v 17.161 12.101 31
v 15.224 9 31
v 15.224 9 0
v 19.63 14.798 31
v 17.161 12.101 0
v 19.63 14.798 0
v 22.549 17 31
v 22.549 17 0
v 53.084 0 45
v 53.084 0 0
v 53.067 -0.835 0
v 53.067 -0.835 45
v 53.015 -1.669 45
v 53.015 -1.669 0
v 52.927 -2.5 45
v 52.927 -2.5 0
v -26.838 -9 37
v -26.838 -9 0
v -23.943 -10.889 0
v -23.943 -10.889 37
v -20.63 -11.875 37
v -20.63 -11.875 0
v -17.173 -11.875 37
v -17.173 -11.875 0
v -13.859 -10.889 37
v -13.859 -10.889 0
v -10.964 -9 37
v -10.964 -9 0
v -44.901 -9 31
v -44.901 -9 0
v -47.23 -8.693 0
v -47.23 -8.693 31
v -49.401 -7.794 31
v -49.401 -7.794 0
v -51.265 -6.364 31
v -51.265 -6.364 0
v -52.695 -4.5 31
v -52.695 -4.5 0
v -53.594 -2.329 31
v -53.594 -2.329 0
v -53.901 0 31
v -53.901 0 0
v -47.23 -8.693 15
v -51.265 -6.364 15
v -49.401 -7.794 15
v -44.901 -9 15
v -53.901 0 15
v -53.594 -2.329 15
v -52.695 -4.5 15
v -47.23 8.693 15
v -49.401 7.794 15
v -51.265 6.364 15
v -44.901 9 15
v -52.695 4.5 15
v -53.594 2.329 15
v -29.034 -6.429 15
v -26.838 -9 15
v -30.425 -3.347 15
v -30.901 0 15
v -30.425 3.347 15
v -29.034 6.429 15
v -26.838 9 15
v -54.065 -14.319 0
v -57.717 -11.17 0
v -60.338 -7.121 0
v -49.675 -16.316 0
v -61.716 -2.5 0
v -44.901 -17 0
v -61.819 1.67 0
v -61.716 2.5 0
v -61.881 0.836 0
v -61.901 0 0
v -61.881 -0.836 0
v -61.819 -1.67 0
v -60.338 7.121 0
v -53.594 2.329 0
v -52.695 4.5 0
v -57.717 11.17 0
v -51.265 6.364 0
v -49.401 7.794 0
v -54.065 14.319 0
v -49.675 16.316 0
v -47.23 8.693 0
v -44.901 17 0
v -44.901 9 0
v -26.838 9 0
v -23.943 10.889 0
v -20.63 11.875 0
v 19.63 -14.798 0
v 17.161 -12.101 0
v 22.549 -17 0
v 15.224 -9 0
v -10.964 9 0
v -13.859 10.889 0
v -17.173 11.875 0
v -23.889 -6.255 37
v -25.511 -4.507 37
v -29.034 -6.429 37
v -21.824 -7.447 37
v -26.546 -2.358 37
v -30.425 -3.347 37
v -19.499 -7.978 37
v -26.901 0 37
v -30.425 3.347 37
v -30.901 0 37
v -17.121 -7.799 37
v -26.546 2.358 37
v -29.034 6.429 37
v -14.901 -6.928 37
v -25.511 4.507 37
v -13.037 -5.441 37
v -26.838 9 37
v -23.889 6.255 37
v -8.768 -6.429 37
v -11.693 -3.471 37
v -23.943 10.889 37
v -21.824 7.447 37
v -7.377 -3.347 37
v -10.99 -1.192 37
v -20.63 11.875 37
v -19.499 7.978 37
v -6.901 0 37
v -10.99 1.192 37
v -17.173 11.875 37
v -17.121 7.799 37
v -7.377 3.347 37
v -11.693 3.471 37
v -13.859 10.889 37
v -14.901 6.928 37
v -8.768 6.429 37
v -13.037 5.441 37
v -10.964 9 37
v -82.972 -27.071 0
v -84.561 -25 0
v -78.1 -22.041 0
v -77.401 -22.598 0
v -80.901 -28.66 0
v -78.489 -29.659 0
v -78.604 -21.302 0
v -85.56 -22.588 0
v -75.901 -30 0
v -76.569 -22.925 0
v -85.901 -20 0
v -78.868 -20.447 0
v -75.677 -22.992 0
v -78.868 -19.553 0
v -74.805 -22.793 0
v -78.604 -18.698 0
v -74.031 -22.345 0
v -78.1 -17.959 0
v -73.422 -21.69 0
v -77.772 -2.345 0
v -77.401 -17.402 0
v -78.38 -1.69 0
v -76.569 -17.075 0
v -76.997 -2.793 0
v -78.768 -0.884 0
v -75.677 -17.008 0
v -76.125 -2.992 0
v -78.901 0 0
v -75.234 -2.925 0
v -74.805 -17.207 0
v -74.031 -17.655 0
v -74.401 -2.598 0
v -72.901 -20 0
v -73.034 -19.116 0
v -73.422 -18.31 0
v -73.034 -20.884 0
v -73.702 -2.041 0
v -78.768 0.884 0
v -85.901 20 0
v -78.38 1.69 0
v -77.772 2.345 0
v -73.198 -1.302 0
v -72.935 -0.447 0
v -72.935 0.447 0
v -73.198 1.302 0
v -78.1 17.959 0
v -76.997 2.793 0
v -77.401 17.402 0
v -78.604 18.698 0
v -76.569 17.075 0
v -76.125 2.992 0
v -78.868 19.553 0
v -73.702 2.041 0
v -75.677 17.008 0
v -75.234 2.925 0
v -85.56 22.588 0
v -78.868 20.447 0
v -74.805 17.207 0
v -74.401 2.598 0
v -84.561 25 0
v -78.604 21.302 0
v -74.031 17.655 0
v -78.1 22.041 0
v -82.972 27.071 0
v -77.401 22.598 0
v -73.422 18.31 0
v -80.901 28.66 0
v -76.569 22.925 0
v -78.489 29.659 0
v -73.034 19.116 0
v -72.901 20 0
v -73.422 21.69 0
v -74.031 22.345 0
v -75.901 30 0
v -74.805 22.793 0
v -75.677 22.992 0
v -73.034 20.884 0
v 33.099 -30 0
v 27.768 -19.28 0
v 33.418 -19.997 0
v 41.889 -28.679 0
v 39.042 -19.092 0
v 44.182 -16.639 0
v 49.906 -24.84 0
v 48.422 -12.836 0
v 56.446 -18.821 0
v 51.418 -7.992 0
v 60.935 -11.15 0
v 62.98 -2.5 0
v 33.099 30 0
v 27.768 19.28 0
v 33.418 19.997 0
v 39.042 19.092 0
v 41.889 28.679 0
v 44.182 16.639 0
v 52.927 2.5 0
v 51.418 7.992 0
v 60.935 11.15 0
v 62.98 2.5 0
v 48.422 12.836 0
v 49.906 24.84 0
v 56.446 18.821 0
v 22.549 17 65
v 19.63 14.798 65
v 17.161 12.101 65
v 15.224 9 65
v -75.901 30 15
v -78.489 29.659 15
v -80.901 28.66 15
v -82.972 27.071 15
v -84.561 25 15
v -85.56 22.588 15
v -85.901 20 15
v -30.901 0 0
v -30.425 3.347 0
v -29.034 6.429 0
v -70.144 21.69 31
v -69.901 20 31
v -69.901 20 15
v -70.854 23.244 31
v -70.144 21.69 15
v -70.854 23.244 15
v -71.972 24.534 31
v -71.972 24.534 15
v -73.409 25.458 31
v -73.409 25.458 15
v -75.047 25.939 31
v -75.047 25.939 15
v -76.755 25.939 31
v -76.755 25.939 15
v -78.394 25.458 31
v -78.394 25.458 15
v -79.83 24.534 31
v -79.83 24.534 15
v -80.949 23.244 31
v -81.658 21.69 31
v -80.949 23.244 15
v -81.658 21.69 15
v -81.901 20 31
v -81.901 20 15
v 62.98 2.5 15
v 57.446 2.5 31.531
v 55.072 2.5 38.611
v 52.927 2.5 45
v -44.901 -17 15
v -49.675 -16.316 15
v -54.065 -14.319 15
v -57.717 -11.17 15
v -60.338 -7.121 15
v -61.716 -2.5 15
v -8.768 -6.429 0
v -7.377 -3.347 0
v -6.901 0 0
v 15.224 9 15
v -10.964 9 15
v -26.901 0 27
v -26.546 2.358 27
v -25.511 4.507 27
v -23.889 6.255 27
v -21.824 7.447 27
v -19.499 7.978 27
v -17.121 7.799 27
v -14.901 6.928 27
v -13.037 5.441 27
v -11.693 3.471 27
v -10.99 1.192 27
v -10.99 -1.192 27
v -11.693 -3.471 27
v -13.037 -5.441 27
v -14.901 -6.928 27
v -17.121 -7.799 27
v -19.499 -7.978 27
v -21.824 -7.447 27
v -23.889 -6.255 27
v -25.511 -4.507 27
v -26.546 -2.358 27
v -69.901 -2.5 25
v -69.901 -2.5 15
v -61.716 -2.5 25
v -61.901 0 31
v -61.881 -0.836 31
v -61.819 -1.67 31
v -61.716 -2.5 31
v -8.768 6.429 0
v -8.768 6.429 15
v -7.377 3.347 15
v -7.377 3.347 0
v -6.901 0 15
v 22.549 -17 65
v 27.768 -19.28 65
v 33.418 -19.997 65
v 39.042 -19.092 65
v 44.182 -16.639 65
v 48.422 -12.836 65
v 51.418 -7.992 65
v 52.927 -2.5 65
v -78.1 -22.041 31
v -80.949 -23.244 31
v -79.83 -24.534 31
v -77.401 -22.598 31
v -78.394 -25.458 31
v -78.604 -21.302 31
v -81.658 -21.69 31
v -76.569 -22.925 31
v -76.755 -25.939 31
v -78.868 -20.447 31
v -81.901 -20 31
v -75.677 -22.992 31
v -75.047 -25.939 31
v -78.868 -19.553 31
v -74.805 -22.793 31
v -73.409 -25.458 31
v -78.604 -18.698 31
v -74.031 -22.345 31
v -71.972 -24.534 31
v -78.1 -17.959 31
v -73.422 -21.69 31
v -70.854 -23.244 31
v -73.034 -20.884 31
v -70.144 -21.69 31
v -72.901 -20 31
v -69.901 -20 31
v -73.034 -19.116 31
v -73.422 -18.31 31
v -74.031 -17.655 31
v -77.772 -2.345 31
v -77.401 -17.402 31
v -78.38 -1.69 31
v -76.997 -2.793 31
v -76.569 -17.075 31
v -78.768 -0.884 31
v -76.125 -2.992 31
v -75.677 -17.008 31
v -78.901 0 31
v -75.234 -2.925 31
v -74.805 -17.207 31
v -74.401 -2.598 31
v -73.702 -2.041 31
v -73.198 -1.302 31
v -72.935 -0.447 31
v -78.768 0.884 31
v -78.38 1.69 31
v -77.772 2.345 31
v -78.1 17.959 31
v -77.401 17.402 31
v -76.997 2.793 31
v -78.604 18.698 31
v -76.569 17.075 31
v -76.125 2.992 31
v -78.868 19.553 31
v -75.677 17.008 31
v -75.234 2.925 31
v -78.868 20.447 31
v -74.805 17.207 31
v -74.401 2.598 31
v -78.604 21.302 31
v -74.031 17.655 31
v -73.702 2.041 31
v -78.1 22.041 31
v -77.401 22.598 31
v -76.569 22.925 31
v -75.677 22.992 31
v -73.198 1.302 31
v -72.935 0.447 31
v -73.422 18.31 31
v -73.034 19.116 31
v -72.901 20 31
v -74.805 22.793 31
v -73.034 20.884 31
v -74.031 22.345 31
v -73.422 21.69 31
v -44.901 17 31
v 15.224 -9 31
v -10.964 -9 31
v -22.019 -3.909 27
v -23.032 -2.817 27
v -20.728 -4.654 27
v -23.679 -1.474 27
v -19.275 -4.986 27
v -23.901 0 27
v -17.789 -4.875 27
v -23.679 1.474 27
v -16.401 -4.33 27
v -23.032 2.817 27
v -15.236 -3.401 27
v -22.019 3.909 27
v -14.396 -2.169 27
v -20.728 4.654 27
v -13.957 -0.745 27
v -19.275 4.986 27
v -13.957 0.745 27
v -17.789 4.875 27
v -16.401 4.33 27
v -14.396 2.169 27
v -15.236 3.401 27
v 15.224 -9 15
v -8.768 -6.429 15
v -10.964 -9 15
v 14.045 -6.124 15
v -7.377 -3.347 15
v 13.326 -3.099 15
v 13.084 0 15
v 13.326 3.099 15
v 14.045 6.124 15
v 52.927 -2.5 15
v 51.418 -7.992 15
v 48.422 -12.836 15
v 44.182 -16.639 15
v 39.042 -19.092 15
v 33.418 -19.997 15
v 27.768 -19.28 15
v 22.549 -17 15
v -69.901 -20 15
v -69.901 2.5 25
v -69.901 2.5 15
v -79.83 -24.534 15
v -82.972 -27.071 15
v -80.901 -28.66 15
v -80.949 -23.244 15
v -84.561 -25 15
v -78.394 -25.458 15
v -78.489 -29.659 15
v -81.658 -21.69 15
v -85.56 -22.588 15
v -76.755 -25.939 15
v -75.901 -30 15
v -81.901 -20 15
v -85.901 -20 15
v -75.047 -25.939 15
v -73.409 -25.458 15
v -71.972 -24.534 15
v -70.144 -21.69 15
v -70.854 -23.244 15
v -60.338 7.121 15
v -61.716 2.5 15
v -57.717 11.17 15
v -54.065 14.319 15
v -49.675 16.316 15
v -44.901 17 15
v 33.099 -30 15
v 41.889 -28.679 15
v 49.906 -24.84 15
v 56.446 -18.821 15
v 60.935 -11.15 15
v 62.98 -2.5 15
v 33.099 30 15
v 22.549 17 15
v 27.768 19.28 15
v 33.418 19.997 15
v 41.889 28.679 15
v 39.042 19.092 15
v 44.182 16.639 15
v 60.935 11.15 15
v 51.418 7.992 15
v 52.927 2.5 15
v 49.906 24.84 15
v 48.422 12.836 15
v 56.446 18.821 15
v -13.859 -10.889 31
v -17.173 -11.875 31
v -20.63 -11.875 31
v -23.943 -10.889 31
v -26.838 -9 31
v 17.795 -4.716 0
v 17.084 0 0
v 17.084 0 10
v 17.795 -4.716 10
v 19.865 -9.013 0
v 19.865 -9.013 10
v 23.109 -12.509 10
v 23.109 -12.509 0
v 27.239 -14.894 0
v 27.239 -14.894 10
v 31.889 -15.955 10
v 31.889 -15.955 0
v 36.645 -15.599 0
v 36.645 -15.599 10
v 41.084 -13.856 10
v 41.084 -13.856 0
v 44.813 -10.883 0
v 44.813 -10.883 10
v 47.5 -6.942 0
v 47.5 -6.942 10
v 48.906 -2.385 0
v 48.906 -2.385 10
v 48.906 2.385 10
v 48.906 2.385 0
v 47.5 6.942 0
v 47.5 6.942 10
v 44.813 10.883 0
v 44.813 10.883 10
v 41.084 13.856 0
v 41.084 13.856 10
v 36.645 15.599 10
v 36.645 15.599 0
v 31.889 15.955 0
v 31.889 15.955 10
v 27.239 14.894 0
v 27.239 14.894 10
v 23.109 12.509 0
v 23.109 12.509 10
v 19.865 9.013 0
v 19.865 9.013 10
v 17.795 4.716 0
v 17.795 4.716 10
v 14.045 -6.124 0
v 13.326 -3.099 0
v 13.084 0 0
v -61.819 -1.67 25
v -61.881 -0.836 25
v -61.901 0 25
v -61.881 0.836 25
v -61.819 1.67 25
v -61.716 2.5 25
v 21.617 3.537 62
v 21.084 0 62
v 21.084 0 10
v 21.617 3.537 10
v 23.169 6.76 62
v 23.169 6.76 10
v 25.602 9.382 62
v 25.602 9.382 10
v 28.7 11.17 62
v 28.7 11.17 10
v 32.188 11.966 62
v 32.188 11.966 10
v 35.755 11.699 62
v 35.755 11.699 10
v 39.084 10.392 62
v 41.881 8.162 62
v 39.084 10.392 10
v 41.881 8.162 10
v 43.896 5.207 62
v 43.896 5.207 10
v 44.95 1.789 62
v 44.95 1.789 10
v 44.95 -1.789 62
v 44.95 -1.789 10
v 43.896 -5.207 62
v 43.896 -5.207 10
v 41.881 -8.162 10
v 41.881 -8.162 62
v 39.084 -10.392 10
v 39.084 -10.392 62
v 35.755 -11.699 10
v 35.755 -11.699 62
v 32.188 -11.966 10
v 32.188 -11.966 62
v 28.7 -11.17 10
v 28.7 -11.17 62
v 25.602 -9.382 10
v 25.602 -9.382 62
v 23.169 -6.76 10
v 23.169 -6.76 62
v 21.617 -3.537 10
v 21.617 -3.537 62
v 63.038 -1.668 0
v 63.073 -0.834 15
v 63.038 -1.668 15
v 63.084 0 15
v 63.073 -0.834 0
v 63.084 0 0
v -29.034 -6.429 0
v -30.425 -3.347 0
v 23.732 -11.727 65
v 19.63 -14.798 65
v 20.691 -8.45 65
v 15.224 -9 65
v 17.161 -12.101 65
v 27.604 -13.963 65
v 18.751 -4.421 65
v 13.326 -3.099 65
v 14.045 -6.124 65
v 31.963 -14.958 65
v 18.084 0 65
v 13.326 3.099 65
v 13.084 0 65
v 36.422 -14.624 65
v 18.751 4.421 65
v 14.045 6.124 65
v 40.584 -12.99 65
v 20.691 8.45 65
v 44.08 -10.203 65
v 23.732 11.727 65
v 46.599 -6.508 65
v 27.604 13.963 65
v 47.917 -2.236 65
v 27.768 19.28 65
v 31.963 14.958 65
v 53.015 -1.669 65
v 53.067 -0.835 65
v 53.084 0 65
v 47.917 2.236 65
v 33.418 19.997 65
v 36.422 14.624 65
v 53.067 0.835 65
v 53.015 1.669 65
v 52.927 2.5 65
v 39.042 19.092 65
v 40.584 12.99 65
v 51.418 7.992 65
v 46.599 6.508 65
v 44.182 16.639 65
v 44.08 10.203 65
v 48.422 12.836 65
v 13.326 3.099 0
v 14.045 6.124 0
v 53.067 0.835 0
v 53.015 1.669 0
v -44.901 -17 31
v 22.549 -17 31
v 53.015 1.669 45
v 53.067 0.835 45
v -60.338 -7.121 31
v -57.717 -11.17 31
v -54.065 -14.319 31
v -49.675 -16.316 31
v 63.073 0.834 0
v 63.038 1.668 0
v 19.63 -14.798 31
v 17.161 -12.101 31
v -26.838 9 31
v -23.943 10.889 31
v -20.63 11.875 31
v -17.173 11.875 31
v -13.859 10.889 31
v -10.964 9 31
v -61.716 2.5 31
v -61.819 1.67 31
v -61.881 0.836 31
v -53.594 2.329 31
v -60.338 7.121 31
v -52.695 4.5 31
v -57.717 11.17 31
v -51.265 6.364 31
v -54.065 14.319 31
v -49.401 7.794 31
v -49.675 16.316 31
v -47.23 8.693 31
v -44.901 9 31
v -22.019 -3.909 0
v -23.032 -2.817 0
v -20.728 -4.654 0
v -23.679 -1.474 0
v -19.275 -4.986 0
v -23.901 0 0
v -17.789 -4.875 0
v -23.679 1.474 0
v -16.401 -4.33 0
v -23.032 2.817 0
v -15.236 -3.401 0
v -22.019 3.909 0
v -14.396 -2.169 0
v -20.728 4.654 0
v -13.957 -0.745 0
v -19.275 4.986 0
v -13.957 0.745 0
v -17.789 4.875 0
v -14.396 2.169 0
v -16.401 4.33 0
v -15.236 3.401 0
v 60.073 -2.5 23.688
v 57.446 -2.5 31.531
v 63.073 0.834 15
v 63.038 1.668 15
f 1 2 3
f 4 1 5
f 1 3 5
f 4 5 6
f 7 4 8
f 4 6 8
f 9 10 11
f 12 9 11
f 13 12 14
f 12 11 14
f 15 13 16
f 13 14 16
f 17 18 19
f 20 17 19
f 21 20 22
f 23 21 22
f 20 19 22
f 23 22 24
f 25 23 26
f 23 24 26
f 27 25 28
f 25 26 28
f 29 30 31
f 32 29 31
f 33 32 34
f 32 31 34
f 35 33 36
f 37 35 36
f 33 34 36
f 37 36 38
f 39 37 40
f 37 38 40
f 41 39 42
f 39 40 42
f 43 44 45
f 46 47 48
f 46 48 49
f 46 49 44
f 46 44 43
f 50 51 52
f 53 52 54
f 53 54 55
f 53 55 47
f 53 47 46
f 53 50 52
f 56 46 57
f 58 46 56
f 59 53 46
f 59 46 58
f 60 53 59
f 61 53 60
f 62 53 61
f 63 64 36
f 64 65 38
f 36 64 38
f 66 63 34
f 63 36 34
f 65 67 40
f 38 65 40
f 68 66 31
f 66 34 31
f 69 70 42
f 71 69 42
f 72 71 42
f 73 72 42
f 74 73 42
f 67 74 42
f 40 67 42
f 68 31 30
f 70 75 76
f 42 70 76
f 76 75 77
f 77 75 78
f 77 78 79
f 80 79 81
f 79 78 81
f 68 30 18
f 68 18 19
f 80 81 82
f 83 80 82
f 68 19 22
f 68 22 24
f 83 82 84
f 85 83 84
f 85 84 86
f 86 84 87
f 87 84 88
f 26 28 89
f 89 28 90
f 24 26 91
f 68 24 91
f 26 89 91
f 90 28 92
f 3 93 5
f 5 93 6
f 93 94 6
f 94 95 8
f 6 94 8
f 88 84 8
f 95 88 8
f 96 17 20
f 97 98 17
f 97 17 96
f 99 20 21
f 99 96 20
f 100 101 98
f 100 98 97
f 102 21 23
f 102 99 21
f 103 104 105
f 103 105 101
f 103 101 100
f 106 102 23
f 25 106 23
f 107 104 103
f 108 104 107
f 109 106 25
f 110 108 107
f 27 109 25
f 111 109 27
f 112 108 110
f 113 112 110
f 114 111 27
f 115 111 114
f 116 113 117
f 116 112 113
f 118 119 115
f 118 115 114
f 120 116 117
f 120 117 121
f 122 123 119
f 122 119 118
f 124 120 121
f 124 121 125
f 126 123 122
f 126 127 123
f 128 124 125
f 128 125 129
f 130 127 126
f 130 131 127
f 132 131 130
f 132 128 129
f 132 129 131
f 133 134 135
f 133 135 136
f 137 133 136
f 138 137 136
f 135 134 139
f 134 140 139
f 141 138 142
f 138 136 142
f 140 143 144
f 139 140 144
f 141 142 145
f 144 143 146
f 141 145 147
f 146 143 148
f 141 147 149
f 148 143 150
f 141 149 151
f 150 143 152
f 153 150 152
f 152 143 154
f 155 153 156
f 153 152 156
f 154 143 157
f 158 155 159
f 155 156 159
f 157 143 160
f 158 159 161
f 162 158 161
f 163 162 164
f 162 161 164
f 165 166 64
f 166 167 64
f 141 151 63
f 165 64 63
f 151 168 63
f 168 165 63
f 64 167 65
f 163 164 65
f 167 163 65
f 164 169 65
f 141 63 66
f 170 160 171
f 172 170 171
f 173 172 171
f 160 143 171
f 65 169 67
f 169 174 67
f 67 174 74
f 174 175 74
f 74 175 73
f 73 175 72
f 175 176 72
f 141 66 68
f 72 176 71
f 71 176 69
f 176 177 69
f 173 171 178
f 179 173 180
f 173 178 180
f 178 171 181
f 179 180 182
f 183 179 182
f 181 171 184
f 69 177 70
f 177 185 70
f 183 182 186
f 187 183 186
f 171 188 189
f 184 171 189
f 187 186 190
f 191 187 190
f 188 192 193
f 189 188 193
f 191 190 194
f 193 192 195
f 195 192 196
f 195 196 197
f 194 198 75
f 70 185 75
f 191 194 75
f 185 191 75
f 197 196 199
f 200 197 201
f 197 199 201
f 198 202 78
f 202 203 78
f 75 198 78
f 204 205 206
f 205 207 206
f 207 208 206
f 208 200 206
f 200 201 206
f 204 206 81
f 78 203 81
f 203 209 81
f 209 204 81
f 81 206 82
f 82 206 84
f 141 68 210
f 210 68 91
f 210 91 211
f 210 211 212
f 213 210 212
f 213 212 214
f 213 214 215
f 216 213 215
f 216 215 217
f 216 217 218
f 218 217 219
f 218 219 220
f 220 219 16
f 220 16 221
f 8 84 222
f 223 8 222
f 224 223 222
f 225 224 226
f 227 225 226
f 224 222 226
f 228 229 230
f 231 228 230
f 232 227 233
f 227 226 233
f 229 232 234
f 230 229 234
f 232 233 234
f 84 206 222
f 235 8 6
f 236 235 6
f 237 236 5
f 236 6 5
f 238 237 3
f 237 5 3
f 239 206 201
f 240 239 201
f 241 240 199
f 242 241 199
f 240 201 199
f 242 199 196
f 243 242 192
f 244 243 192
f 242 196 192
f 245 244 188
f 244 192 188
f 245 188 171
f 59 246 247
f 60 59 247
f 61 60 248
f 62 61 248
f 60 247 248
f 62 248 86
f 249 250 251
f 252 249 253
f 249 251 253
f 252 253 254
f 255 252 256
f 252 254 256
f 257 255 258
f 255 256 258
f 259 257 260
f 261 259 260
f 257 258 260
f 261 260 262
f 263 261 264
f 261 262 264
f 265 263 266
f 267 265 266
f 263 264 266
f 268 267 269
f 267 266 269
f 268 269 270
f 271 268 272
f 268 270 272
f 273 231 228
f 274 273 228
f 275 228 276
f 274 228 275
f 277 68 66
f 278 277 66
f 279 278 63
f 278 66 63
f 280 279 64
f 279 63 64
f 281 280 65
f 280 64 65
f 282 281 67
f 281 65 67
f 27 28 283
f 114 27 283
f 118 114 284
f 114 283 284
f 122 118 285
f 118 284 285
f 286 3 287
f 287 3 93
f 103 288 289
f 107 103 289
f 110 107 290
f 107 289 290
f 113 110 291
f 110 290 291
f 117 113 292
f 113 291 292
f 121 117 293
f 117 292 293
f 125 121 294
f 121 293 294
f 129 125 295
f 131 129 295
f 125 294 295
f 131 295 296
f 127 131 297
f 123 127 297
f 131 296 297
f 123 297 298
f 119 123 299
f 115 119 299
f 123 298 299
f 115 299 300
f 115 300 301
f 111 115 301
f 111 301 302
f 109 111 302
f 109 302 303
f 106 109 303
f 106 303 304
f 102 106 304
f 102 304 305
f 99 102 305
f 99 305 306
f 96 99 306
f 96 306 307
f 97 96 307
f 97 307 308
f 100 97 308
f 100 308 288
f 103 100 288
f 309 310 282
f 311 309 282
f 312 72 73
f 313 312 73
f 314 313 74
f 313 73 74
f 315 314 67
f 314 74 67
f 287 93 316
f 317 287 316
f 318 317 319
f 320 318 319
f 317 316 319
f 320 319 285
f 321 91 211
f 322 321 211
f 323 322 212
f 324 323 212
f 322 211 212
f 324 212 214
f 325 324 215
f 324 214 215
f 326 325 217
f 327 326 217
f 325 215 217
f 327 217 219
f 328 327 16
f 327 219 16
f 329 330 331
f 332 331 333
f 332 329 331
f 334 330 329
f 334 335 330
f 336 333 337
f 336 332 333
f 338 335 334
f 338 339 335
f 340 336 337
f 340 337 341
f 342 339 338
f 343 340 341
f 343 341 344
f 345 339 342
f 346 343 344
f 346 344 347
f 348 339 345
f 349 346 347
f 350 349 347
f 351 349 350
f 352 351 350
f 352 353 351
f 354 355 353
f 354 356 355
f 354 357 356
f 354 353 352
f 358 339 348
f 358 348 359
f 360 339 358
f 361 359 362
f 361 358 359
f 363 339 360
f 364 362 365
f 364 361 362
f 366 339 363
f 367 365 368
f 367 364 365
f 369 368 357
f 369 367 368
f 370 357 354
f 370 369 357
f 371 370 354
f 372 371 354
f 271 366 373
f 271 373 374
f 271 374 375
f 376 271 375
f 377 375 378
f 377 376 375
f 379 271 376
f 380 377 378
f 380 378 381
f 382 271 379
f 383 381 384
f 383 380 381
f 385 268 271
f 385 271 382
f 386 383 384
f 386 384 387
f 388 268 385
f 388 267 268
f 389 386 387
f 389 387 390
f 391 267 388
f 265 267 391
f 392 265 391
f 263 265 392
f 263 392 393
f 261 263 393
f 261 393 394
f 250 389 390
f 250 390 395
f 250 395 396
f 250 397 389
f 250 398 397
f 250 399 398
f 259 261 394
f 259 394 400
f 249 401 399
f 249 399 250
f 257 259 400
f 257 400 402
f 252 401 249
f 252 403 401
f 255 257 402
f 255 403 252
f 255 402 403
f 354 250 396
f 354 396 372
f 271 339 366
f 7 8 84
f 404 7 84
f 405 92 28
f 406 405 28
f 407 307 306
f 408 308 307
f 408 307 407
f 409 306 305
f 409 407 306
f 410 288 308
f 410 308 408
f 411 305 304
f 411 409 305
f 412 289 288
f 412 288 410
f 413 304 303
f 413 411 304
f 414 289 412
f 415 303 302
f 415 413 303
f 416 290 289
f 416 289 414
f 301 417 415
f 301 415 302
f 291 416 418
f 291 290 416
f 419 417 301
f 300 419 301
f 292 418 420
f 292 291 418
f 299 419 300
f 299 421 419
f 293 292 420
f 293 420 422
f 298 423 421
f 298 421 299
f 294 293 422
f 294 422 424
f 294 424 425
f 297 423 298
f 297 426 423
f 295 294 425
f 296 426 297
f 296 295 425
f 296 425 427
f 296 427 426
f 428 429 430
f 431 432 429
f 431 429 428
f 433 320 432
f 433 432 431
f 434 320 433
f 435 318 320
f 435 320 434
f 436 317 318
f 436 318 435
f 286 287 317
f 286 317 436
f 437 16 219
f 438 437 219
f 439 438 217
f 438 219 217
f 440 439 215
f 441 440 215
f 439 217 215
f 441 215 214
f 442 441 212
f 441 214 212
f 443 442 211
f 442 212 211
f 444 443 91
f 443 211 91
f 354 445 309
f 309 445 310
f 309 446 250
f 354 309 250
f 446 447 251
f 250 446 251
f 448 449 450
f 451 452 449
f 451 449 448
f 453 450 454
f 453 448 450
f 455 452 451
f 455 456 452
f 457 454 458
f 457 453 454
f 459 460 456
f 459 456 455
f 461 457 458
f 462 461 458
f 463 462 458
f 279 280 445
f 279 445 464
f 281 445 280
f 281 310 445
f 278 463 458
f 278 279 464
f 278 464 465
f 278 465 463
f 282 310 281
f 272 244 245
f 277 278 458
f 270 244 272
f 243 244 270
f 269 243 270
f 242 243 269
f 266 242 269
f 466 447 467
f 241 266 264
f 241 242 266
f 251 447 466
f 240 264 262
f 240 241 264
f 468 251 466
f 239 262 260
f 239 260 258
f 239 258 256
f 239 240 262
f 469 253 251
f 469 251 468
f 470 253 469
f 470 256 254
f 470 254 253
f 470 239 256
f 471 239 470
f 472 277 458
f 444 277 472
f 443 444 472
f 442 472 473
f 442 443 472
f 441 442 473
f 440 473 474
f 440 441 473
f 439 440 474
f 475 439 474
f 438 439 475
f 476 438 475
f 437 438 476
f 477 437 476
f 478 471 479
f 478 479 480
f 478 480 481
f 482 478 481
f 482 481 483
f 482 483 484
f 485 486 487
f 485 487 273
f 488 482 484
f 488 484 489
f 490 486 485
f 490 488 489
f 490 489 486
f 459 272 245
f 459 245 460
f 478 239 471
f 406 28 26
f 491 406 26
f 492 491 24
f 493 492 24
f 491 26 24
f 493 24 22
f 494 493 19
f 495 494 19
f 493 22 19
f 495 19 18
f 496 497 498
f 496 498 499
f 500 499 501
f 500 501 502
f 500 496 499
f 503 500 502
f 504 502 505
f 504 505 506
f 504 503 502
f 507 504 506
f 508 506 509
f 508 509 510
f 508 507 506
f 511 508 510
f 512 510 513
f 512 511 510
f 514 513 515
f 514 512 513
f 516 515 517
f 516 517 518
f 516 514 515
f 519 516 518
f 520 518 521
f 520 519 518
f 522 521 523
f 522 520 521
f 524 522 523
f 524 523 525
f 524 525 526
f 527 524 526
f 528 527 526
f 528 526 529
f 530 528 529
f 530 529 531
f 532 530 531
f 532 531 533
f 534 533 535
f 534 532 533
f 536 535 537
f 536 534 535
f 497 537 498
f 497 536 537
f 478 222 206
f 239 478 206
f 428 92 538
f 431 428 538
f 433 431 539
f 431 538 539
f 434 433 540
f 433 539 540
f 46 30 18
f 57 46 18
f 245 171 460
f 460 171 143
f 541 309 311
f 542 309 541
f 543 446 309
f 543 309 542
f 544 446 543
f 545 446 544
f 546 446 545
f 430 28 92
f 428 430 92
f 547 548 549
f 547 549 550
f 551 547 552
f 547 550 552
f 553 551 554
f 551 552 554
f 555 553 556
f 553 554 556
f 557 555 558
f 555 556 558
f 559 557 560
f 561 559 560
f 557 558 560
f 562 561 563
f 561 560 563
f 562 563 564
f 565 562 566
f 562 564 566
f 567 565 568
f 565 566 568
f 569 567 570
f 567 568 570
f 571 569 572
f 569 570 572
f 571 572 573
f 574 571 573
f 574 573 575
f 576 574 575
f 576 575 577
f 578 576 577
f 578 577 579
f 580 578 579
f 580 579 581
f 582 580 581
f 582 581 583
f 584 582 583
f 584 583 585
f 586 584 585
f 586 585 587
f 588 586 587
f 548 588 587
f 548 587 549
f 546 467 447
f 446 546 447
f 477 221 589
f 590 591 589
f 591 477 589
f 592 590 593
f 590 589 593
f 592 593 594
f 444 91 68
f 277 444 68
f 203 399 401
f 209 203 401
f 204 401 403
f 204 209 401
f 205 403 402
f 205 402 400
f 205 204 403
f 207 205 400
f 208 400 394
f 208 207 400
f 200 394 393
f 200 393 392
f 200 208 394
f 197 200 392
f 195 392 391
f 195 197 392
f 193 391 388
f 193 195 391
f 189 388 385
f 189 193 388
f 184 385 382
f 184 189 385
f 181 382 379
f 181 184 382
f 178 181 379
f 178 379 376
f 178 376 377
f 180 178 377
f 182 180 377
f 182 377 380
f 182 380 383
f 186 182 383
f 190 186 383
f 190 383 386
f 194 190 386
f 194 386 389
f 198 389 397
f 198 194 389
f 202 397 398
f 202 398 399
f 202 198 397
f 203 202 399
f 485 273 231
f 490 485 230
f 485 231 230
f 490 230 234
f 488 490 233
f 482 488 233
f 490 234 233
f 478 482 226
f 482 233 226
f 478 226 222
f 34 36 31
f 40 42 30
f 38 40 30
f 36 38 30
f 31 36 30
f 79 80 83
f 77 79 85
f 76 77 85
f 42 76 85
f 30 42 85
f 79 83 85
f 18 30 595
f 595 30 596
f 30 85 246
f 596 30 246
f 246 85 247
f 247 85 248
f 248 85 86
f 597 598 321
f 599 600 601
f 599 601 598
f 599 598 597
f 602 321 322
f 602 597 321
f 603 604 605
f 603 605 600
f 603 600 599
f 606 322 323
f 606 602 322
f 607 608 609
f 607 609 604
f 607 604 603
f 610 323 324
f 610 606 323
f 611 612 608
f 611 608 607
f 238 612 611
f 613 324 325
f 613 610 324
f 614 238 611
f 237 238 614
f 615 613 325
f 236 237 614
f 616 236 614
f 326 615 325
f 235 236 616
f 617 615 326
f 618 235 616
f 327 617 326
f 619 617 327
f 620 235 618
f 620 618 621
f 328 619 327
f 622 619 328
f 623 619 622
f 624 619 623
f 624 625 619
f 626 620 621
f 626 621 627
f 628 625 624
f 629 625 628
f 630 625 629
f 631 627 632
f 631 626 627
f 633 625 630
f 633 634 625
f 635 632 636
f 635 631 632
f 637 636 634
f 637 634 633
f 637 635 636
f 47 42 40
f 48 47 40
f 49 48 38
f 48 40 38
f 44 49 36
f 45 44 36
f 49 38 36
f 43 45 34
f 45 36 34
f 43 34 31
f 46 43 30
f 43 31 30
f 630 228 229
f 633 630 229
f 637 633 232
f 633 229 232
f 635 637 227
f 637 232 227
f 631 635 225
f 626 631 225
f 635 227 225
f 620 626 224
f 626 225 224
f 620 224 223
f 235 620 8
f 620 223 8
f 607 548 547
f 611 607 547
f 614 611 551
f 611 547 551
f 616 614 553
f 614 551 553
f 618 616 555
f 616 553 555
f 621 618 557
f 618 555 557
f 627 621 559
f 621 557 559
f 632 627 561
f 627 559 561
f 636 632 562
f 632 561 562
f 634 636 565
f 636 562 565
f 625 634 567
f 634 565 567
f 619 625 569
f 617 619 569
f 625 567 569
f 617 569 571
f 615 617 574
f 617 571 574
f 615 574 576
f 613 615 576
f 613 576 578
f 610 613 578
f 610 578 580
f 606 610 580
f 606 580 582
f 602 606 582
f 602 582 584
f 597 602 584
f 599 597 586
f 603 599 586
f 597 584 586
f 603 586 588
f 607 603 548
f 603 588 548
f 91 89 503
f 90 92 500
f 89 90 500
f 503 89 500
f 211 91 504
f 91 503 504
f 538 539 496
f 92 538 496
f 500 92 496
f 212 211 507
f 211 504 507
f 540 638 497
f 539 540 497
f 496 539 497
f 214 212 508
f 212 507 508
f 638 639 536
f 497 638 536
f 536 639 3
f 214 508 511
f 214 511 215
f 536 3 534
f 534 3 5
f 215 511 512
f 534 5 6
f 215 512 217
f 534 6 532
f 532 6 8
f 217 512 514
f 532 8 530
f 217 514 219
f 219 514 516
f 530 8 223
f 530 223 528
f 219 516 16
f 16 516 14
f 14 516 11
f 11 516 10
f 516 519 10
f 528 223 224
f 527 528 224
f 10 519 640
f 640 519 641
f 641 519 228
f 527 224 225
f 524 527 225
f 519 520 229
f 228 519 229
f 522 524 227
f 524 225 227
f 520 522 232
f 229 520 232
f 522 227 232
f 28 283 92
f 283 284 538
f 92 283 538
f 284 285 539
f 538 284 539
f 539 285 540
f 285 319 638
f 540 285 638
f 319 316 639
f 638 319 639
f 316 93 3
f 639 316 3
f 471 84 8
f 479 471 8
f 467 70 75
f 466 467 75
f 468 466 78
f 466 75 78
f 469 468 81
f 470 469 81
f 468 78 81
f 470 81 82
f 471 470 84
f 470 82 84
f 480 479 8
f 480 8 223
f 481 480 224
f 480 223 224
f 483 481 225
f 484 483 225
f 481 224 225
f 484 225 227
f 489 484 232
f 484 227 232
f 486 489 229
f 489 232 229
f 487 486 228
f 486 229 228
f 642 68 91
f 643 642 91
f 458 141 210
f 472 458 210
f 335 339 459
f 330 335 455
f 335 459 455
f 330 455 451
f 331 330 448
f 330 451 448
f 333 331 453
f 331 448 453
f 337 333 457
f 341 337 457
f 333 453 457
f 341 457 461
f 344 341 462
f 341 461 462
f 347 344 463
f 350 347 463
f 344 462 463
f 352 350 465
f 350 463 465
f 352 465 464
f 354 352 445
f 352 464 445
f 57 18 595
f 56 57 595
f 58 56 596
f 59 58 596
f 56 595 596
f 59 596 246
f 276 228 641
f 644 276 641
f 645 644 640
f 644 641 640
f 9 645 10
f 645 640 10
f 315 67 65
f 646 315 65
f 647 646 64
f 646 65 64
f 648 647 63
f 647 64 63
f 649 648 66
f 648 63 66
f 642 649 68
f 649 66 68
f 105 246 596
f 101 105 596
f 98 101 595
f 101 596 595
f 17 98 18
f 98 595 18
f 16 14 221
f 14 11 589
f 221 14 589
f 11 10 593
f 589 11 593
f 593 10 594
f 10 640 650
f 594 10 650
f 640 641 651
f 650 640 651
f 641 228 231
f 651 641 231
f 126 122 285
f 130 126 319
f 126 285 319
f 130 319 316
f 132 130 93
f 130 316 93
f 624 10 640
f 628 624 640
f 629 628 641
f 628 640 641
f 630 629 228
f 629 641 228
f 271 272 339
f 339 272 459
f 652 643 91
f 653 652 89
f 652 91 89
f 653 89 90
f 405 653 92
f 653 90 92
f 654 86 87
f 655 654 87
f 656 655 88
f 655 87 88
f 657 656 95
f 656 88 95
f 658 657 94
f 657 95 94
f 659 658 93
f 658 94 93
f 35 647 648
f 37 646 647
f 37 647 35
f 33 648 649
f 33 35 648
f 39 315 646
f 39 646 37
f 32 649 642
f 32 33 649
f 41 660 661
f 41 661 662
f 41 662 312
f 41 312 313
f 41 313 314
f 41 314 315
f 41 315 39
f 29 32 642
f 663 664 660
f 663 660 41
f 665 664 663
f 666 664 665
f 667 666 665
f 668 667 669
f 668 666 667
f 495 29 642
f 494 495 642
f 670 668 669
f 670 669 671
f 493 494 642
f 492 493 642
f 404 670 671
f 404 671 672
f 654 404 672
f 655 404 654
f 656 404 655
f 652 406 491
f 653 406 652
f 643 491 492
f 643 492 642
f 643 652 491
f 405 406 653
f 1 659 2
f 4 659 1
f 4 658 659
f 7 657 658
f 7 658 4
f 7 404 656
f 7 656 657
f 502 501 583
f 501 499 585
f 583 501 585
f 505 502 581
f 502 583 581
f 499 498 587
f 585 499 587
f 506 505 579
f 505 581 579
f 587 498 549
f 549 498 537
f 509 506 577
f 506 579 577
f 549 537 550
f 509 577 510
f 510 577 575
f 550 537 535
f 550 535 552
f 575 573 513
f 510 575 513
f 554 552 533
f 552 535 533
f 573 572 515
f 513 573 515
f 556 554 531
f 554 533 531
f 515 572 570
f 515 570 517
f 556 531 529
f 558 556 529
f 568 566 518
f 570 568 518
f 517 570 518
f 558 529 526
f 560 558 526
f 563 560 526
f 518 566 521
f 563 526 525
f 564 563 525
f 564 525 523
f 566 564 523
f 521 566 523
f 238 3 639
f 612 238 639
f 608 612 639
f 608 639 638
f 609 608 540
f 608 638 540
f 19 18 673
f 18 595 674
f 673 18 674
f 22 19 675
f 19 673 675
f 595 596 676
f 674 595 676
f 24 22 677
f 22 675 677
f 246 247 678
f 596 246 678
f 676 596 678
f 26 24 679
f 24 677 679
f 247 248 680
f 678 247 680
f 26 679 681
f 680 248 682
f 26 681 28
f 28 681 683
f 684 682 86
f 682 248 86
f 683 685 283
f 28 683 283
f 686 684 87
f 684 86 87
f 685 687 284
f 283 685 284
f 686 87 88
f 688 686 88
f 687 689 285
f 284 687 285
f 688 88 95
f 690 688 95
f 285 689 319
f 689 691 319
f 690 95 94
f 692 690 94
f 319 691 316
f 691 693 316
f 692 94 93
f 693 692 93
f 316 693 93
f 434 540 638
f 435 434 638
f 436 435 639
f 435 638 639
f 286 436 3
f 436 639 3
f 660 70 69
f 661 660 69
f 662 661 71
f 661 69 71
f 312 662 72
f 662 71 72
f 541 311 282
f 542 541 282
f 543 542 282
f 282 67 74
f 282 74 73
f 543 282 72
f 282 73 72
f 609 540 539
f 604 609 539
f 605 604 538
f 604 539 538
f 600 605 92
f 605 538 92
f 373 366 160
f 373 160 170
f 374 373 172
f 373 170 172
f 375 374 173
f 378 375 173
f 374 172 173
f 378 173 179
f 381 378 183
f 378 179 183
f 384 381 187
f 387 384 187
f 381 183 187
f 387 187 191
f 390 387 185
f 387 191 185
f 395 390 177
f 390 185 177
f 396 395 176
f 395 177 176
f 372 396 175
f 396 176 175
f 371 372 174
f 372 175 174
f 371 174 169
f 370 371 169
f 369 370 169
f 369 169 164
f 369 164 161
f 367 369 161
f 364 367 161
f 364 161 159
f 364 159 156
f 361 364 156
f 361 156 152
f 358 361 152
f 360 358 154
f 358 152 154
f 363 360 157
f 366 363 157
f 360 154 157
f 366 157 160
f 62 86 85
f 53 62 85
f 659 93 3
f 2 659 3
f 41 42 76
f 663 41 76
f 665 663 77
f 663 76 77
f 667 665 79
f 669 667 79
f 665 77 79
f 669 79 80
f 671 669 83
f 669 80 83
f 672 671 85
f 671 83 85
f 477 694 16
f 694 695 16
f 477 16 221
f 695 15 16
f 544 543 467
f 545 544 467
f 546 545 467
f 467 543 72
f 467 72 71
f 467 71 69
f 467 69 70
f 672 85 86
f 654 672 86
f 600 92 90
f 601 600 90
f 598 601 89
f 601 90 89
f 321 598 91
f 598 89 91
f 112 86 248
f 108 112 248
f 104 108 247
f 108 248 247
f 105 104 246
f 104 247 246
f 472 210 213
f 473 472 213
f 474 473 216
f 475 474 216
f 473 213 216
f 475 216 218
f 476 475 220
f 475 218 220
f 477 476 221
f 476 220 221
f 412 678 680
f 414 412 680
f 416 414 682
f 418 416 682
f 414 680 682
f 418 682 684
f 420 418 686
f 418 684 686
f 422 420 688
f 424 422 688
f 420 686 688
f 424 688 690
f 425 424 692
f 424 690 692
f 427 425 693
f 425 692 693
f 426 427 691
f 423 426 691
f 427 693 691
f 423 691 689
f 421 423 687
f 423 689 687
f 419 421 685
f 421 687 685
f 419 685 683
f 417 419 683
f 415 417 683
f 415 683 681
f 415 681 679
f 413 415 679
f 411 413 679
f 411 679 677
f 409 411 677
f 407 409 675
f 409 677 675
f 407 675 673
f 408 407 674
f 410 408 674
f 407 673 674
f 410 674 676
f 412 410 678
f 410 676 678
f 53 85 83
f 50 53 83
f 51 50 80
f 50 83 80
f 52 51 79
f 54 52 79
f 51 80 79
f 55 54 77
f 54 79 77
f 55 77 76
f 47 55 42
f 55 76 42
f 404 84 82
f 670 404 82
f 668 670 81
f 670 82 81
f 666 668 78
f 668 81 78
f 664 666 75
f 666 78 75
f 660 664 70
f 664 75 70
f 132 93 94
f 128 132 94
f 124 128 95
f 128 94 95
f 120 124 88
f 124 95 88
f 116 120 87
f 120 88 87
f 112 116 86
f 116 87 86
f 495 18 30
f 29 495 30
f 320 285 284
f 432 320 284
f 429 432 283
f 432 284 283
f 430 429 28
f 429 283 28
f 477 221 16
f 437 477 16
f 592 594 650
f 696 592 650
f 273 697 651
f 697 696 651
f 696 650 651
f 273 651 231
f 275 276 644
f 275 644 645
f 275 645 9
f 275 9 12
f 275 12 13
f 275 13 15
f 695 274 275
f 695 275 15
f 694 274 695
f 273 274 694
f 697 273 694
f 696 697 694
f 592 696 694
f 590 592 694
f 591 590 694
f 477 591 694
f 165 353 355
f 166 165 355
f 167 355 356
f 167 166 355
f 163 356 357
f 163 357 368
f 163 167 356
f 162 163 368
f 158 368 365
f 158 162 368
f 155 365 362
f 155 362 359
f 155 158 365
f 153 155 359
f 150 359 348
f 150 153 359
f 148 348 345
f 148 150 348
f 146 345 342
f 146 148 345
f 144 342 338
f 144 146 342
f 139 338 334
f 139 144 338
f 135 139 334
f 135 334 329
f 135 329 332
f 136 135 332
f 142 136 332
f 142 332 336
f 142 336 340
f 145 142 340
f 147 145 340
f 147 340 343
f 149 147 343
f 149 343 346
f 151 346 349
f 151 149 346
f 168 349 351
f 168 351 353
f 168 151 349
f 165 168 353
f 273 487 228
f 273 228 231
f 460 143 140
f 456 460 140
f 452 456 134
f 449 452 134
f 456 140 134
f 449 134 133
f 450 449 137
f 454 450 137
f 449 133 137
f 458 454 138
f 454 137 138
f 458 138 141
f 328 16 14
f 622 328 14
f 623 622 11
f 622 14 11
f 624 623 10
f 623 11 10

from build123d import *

# Parameters (mm, degrees)
F1_DEPTH     = 15
F0_R         = 3
F2_DEPTH     = 31
F3_DEPTH     = 25
F4_DEPTH     = 31
F5_DEPTH     = 37
F6_DEPTH     = 27
F7_DEPTH     = 65
F8_DEPTH     = 10
F9_SIZE2     = 3
F9_SIZE      = 3
F10_DEPTH    = 45
F11_T2_ANGLE = 306.9338182571


# Not quite as in the source:
# - a fillet or chamfer that OpenCascade refuses, or shapes differently, is made with other operations: its cross-section is extruded or revolved along the edge and cut away or added


with BuildPart() as f1:
    # F0 (on Top) → F1 (new body)
    with BuildSketch(Plane.XY):
        with BuildLine():
            Line((-85.9011153158, 20), (-85.9011153158, 0))
            Line((-85.9011153158, 0), (-85.9011153158, -20))
            ThreePointArc((-85.9011153158, -20), (-82.9721818815, -27.0710655334), (-75.9011153158, -29.9999964754))
            Line((-75.9011153158, -29.9999964754), (33.0988846842, -29.9999964754))
            ThreePointArc((33.0988846842, -29.9999964754), (53.399789309, -22.0744789725), (62.9799943814, -2.5))
            Line((62.9799943814, -2.5), (52.9274773566, -2.5))
            ThreePointArc((52.9274773566, -2.5), (41.6994339923, -18.0493822328), (22.5486887708, -17))
            Line((22.5486887708, -17), (-44.9011153158, -17))
            ThreePointArc((-44.9011153158, -17), (-56.0029169714, -12.8743931896), (-61.7162870366, -2.5))
            Line((-61.7162870366, -2.5), (-69.9011153158, -2.5))
            Line((-69.9011153158, -2.5), (-69.9011153158, -19.9999964754))
            ThreePointArc((-69.9011153158, -19.9999964754), (-75.9011153158, -25.9999964754), (-81.9011153158, -19.9999964754))
            Line((-81.9011153158, -19.9999964754), (-81.9011153158, 0))
            Line((-81.9011153158, 0), (-81.9011153158, 19.9999964754))
            ThreePointArc((-81.9011153158, 19.9999964754), (-75.9011153158, 25.9999964754), (-69.9011153158, 19.9999964754))
            Line((-69.9011153158, 19.9999964754), (-69.9011153158, 2.5))
            Line((-69.9011153158, 2.5), (-61.7162870366, 2.5))
            ThreePointArc((-61.7162870366, 2.5), (-56.0029169714, 12.8743931896), (-44.9011153158, 17))
            Line((-44.9011153158, 17), (22.5486887708, 17))
            ThreePointArc((22.5486887708, 17), (41.6994339923, 18.0493822328), (52.9274773566, 2.5))
            Line((52.9274773566, 2.5), (62.9799943814, 2.5))
            ThreePointArc((62.9799943814, 2.5), (53.399789309, 22.0744789725), (33.0988846842, 29.9999964754))
            Line((33.0988846842, 29.9999964754), (-75.9011153158, 29.9999964754))
            ThreePointArc((-75.9011153158, 29.9999964754), (-82.9721818815, 27.0710655334), (-85.9011153158, 20))
        make_face()
    extrude(amount=F1_DEPTH)

    # F0 (on Top) → F2 (join)
    with BuildSketch(Plane.XY):
        with BuildLine():
            Line((-69.9011153158, -19.9999964754), (-69.9011153158, -2.5))
            Line((-69.9011153158, -2.5), (-69.9011153158, 0))
            Line((-69.9011153158, 0), (-69.9011153158, 2.5))
            Line((-69.9011153158, 2.5), (-69.9011153158, 19.9999964754))
            ThreePointArc((-69.9011153158, 19.9999964754), (-75.9011153158, 25.9999964754), (-81.9011153158, 19.9999964754))
            Line((-81.9011153158, 19.9999964754), (-81.9011153158, 0))
            Line((-81.9011153158, 0), (-81.9011153158, -19.9999964754))
            ThreePointArc((-81.9011153158, -19.9999964754), (-75.9011153158, -25.9999964754), (-69.9011153158, -19.9999964754))
        make_face()
        with Locations((-75.9011153158, -19.9999964754)):
            Circle(F0_R, mode=Mode.SUBTRACT)
        with BuildLine():
            ThreePointArc((-72.9011153158, 0), (-75.9011153158, -3), (-78.9011153158, 0))
            ThreePointArc((-78.9011153158, 0), (-75.9011153158, 3), (-72.9011153158, 0))
        make_face(mode=Mode.SUBTRACT)
        with Locations((-75.9011153158, 19.9999964754)):
            Circle(F0_R, mode=Mode.SUBTRACT)
    extrude(amount=F2_DEPTH)

    # F0 (on Top) → F3 (join)
    with BuildSketch(Plane.XY):
        with BuildLine():
            Line((-69.9011153158, -2.5), (-61.7162870366, -2.5))
            ThreePointArc((-61.7162870366, -2.5), (-61.8548452778, -1.253411494), (-61.9011153158, 0))
            ThreePointArc((-61.9011153158, 0), (-61.8548452778, 1.253411494), (-61.7162870366, 2.5))
            Line((-61.7162870366, 2.5), (-69.9011153158, 2.5))
            Line((-69.9011153158, 2.5), (-69.9011153158, 0))
            Line((-69.9011153158, 0), (-69.9011153158, -2.5))
        make_face()
    extrude(amount=F3_DEPTH)


with BuildPart() as f1b:
    # F0 (on Top) → F1, piece 2 (new body)
    with BuildSketch(Plane.XY):
        with BuildLine():
            Line((-44.9011153158, -9), (-26.838369249, -9))
            ThreePointArc((-26.838369249, -9), (-29.838369249, -4.9372539332), (-30.9011153158, 0))
            ThreePointArc((-30.9011153158, 0), (-29.838369249, 4.9372539332), (-26.838369249, 9))
            Line((-26.838369249, 9), (-44.9011153158, 9))
            ThreePointArc((-44.9011153158, 9), (-51.2650763465, 6.3639610307), (-53.9011153158, 0))
            ThreePointArc((-53.9011153158, 0), (-51.2650763465, -6.3639610307), (-44.9011153158, -9))
        make_face()
    extrude(amount=F1_DEPTH)


with BuildPart() as f1c:
    # F0 (on Top) → F1, piece 3 (new body)
    with BuildSketch(Plane.XY):
        with BuildLine():
            Line((-10.9638613826, -9), (15.2237714241, -9))
            ThreePointArc((15.2237714241, -9), (13.6265494577, -4.6253960917), (13.0843425236, 0))
            ThreePointArc((13.0843425236, 0), (13.6265494577, 4.6253960917), (15.2237714241, 9))
            Line((15.2237714241, 9), (-10.9638613826, 9))
            ThreePointArc((-10.9638613826, 9), (-7.9638613826, 4.9372539332), (-6.9011153158, 0))
            ThreePointArc((-6.9011153158, 0), (-7.9638613826, -4.9372539332), (-10.9638613826, -9))
        make_face()
    extrude(amount=F1_DEPTH)


with BuildPart() as f4:
    # F0 (on Top) → F4 (new body)
    with BuildSketch(Plane.XY):
        with BuildLine():
            Line((-44.9011153158, -17), (22.5486887708, -17))
            ThreePointArc((22.5486887708, -17), (18.3335324962, -13.5060580309), (15.2237714241, -9))
            Line((15.2237714241, -9), (-10.9638613826, -9))
            ThreePointArc((-10.9638613826, -9), (-18.9011153158, -12), (-26.838369249, -9))
            Line((-26.838369249, -9), (-44.9011153158, -9))
            ThreePointArc((-44.9011153158, -9), (-51.2650763465, -6.3639610307), (-53.9011153158, 0))
            ThreePointArc((-53.9011153158, 0), (-51.2650763465, 6.3639610307), (-44.9011153158, 9))
            Line((-44.9011153158, 9), (-26.838369249, 9))
            ThreePointArc((-26.838369249, 9), (-18.9011153158, 12), (-10.9638613826, 9))
            Line((-10.9638613826, 9), (15.2237714241, 9))
            ThreePointArc((15.2237714241, 9), (18.3335324962, 13.5060580309), (22.5486887708, 17))
            Line((22.5486887708, 17), (-44.9011153158, 17))
            ThreePointArc((-44.9011153158, 17), (-56.0029169714, 12.8743931896), (-61.7162870366, 2.5))
            ThreePointArc((-61.7162870366, 2.5), (-61.8548452778, 1.253411494), (-61.9011153158, 0))
            ThreePointArc((-61.9011153158, 0), (-61.8548452778, -1.253411494), (-61.7162870366, -2.5))
            ThreePointArc((-61.7162870366, -2.5), (-56.0029169714, -12.8743931896), (-44.9011153158, -17))
        make_face()
    extrude(amount=F4_DEPTH)


with BuildPart() as f5:
    # F0 (on Top) → F5 (new body)
    with BuildSketch(Plane.XY):
        with BuildLine():
            ThreePointArc((-26.838369249, -9), (-18.9011153158, -12), (-10.9638613826, -9))
            ThreePointArc((-10.9638613826, -9), (-7.9638613826, -4.9372539332), (-6.9011153158, 0))
            ThreePointArc((-6.9011153158, 0), (-7.9638613826, 4.9372539332), (-10.9638613826, 9))
            ThreePointArc((-10.9638613826, 9), (-18.9011153158, 12), (-26.838369249, 9))
            ThreePointArc((-26.838369249, 9), (-29.838369249, 4.9372539332), (-30.9011153158, 0))
            ThreePointArc((-30.9011153158, 0), (-29.838369249, -4.9372539332), (-26.838369249, -9))
        make_face()
        with BuildLine():
            ThreePointArc((-10.9011153158, 0), (-18.9011153158, -8), (-26.9011153158, 0))
            ThreePointArc((-26.9011153158, 0), (-18.9011153158, 8), (-10.9011153158, 0))
        make_face(mode=Mode.SUBTRACT)
    extrude(amount=F5_DEPTH)

    # F0 (on Top) → F6 (join)
    with BuildSketch(Plane.XY):
        with BuildLine():
            ThreePointArc((-10.9011153158, 0), (-18.9011153158, 8), (-26.9011153158, 0))
            ThreePointArc((-26.9011153158, 0), (-18.9011153158, -8), (-10.9011153158, 0))
        make_face()
        with BuildLine():
            ThreePointArc((-13.9011153158, 0), (-18.9011153158, -5), (-23.9011153158, 0))
            ThreePointArc((-23.9011153158, 0), (-18.9011153158, 5), (-13.9011153158, 0))
        make_face(mode=Mode.SUBTRACT)
    extrude(amount=F6_DEPTH)


with BuildPart() as f7:
    # F0 (on Top) → F7 (new body)
    with BuildSketch(Plane.XY):
        with BuildLine():
            ThreePointArc((22.5486887708, -17), (41.6994339923, -18.0493822328), (52.9274773566, -2.5))
            ThreePointArc((52.9274773566, -2.5), (53.0450877084, -1.2524582509), (53.0843425236, 0))
            ThreePointArc((53.0843425236, 0), (53.0450877084, 1.2524582509), (52.9274773566, 2.5))
            ThreePointArc((52.9274773566, 2.5), (41.6994339923, 18.0493822328), (22.5486887708, 17))
            ThreePointArc((22.5486887708, 17), (18.3335324962, 13.5060580309), (15.2237714241, 9))
            ThreePointArc((15.2237714241, 9), (13.6265494577, 4.6253960917), (13.0843425236, 0))
            ThreePointArc((13.0843425236, 0), (13.6265494577, -4.6253960917), (15.2237714241, -9))
            ThreePointArc((15.2237714241, -9), (18.3335324962, -13.5060580309), (22.5486887708, -17))
        make_face()
        with BuildLine():
            ThreePointArc((49.0843425236, 0), (33.0843425236, -16), (17.0843425236, 0))
            ThreePointArc((17.0843425236, 0), (33.0843425236, 16), (49.0843425236, 0))
        make_face(mode=Mode.SUBTRACT)
        with BuildLine():
            ThreePointArc((49.0843425236, 0), (33.0843425236, 16), (17.0843425236, 0))
            ThreePointArc((17.0843425236, 0), (33.0843425236, -16), (49.0843425236, 0))
        make_face()
        with BuildLine():
            ThreePointArc((45.0843425236, 0), (33.0843425236, -12), (21.0843425236, 0))
            ThreePointArc((21.0843425236, 0), (33.0843425236, 12), (45.0843425236, 0))
        make_face(mode=Mode.SUBTRACT)
    extrude(amount=F7_DEPTH)

    # F0 (on Top) → F8 (cut)
    with BuildSketch(Plane.XY):
        with BuildLine():
            ThreePointArc((49.0843425236, 0), (33.0843425236, 16), (17.0843425236, 0))
            ThreePointArc((17.0843425236, 0), (33.0843425236, -16), (49.0843425236, 0))
        make_face()
        with BuildLine():
            ThreePointArc((45.0843425236, 0), (33.0843425236, -12), (21.0843425236, 0))
            ThreePointArc((21.0843425236, 0), (33.0843425236, 12), (45.0843425236, 0))
        make_face(mode=Mode.SUBTRACT)
    extrude(amount=F8_DEPTH, mode=Mode.SUBTRACT)

    # F9
    f9_edges = [f7.edges().sort_by_distance(p)[0] for p in [
        (45.084343, 0, 65),
    ]]
    chamfer(f9_edges, length=F9_SIZE, length2=F9_SIZE2)


with BuildPart() as f10:
    # F0 (on Top) → F10 (new body)
    with BuildSketch(Plane.XY):
        with BuildLine():
            Line((52.9274773566, -2.5), (62.9799943814, -2.5))
            ThreePointArc((62.9799943814, -2.5), (63.058244136, -1.2510883797), (63.0843425236, 0))
            ThreePointArc((63.0843425236, 0), (63.058244136, 1.2510883797), (62.9799943814, 2.5))
            Line((62.9799943814, 2.5), (52.9274773566, 2.5))
            ThreePointArc((52.9274773566, 2.5), (53.0450877084, 1.2524582509), (53.0843425236, 0))
            ThreePointArc((53.0843425236, 0), (53.0450877084, -1.2524582509), (52.9274773566, -2.5))
        make_face()
    extrude(amount=F10_DEPTH)

    # F11: chamfer of 10 x 30 on 1 edges, made by hand

    # F11_s1 → F11_t2 (revolve, cut)
    with BuildSketch(Plane(origin=(6.6021107949, 13.2226558591, 0), x_dir=(0, 0, 1), z_dir=(-0.4467146032, -0.8946765132, 0))):
        Polygon((45, -9.5997842104), (15, 0.4002157896), (45, 0.4002157896), align=None)
    revolve(axis=Axis((33.0843425236, 0, 45), (0, 0, -1)), revolution_arc=F11_T2_ANGLE, mode=Mode.SUBTRACT)


solid = Compound([f1.part, f1b.part, f1c.part, f4.part, f5.part, f7.part, f10.part])
